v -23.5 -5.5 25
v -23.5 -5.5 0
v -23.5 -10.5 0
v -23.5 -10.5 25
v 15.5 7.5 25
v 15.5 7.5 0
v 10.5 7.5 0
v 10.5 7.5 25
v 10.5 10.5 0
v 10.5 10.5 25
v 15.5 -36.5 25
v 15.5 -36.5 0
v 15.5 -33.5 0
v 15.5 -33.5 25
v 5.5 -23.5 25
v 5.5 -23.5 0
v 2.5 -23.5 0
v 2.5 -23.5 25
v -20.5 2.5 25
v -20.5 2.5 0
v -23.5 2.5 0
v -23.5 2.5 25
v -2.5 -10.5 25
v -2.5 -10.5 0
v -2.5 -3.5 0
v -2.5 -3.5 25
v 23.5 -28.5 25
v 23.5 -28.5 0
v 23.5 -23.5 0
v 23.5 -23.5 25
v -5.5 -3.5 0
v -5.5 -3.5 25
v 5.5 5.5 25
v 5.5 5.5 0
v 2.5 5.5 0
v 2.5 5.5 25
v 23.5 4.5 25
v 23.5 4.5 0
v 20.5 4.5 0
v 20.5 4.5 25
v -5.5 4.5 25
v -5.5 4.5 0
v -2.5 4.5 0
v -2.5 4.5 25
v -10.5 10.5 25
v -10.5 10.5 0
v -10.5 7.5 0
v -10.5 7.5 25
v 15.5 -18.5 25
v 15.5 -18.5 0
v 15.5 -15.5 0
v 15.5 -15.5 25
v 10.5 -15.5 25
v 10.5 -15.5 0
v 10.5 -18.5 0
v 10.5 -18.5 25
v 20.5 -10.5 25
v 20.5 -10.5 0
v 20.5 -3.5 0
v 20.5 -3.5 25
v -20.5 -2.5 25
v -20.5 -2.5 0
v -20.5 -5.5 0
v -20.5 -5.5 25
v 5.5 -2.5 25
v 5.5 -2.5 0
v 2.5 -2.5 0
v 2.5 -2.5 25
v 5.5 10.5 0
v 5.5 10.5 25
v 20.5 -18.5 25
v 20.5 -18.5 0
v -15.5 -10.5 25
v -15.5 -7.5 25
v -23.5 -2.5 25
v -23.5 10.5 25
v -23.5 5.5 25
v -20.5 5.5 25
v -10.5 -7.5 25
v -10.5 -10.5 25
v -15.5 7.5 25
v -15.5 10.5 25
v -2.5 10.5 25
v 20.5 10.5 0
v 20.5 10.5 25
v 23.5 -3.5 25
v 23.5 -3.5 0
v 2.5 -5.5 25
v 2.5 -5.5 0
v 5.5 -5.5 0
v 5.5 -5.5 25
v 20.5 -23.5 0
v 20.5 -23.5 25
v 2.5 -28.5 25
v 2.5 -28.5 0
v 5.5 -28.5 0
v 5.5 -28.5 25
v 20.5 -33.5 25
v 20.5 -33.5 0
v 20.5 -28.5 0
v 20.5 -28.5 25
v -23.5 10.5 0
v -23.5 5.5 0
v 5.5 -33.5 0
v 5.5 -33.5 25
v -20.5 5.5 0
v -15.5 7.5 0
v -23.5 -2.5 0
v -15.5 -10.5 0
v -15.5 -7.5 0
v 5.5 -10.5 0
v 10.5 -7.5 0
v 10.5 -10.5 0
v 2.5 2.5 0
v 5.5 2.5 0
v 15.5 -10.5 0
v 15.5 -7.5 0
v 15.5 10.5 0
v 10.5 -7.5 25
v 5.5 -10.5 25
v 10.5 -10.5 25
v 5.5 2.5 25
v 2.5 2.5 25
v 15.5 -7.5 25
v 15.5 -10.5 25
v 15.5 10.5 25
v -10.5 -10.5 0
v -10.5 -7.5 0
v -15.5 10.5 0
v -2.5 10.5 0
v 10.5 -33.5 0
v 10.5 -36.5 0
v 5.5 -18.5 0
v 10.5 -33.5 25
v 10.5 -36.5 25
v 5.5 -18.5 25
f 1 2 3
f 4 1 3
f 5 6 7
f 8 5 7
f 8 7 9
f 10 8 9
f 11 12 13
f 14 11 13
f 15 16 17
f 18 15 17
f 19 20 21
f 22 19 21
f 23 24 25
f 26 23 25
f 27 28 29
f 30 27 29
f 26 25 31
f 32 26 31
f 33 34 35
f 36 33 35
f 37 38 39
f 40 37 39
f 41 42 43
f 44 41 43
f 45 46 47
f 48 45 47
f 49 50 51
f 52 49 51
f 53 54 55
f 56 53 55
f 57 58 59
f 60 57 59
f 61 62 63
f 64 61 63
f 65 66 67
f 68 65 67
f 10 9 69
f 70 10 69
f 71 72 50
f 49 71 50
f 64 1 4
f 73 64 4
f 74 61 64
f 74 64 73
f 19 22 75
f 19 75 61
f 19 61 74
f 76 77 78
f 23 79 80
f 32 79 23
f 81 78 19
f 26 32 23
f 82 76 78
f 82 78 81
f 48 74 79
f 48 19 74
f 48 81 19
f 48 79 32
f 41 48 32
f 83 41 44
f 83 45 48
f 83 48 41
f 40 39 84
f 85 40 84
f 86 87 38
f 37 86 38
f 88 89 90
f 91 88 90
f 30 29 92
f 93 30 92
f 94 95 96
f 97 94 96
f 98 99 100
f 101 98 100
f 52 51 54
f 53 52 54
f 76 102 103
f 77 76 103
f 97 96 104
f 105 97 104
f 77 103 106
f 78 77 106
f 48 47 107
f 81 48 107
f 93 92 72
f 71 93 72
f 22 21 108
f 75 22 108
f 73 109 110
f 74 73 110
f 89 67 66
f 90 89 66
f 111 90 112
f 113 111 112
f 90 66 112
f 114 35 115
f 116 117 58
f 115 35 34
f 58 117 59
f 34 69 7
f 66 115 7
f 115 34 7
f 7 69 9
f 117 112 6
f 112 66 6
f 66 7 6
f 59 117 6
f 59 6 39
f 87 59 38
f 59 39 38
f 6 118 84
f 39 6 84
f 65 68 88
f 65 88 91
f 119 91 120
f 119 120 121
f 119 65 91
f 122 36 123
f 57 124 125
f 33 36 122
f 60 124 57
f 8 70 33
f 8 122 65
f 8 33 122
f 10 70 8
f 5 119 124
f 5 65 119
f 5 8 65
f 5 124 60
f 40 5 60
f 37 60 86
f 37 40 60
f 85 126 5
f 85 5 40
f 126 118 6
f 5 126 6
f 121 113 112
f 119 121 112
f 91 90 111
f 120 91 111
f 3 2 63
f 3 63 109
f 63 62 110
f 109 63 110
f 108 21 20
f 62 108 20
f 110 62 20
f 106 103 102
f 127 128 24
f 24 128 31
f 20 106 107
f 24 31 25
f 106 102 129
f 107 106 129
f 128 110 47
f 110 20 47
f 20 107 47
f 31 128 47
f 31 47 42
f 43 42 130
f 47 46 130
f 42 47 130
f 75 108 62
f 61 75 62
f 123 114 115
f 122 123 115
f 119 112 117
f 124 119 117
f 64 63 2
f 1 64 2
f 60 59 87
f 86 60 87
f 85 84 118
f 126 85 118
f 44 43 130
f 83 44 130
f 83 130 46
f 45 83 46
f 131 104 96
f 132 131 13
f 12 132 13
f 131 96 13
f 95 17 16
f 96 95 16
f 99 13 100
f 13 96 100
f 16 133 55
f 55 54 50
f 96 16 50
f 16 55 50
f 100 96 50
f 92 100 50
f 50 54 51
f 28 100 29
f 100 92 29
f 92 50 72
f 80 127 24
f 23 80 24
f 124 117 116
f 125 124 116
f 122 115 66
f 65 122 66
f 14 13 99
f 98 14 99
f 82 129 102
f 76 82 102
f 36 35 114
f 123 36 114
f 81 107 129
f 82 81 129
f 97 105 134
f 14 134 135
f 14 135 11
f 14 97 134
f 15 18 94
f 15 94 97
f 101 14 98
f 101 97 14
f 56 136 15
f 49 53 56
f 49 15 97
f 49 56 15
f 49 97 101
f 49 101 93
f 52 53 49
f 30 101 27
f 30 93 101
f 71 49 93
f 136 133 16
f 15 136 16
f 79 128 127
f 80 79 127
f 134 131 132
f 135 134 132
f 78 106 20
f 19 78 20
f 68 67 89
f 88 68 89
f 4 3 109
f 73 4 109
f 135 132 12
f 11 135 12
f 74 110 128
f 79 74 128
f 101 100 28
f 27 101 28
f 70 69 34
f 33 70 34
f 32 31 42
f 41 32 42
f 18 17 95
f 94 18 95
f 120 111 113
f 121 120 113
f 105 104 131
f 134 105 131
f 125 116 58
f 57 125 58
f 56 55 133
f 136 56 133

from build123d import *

# Parameters (mm, degrees)
F1_DEPTH = 25


# Not quite as in the source:
# - a feature names something its author has since deleted; it is built from what else it names


with BuildPart() as f1:
    # F0 (on Top) → F1 (new body)
    with BuildSketch(Plane.XY):
        Polygon((10.5, 10.5), (5.5, 10.5), (5.5, 5.5), (2.5, 5.5), (2.5, 2.5), (5.5, 2.5), (5.5, -2.5), (2.5, -2.5), (2.5, -5.5), (5.5, -5.5), (5.5, -10.5), (10.5, -10.5), (10.5, -7.5), (15.5, -7.5), (15.5, -10.5), (20.5, -10.5), (20.5, -3.5), (23.5, -3.5), (23.5, 4.5), (20.5, 4.5), (20.5, 10.5), (15.5, 10.5), (15.5, 7.5), (10.5, 7.5), align=None)
    extrude(amount=F1_DEPTH)


with BuildPart() as f1b:
    # F0 (on Top) → F1, piece 2 (new body)
    with BuildSketch(Plane.XY):
        Polygon((-15.5, 10.5), (-23.5, 10.5), (-23.5, 5.5), (-20.5, 5.5), (-20.5, 2.5), (-23.5, 2.5), (-23.5, -2.5), (-20.5, -2.5), (-20.5, -5.5), (-23.5, -5.5), (-23.5, -10.5), (-15.5, -10.5), (-15.5, -7.5), (-10.5, -7.5), (-10.5, -10.5), (-2.5, -10.5), (-2.5, -3.5), (-5.5, -3.5), (-5.5, 4.5), (-2.5, 4.5), (-2.5, 10.5), (-10.5, 10.5), (-10.5, 7.5), (-15.5, 7.5), align=None)
    extrude(amount=F1_DEPTH)


with BuildPart() as f1c:
    # F0 (on Top) → F1, piece 3 (new body)
    with BuildSketch(Plane.XY):
        Polygon((10.5, -18.5), (5.5, -18.5), (5.5, -23.5), (2.5, -23.5), (2.5, -28.5), (5.5, -28.5), (5.5, -33.5), (10.5, -33.5), (10.5, -36.5), (15.5, -36.5), (15.5, -33.5), (20.5, -33.5), (20.5, -28.5), (23.5, -28.5), (23.5, -23.5), (20.5, -23.5), (20.5, -18.5), (15.5, -18.5), (15.5, -15.5), (10.5, -15.5), align=None)
    extrude(amount=F1_DEPTH)


solid = Compound([f1.part, f1b.part, f1c.part])
